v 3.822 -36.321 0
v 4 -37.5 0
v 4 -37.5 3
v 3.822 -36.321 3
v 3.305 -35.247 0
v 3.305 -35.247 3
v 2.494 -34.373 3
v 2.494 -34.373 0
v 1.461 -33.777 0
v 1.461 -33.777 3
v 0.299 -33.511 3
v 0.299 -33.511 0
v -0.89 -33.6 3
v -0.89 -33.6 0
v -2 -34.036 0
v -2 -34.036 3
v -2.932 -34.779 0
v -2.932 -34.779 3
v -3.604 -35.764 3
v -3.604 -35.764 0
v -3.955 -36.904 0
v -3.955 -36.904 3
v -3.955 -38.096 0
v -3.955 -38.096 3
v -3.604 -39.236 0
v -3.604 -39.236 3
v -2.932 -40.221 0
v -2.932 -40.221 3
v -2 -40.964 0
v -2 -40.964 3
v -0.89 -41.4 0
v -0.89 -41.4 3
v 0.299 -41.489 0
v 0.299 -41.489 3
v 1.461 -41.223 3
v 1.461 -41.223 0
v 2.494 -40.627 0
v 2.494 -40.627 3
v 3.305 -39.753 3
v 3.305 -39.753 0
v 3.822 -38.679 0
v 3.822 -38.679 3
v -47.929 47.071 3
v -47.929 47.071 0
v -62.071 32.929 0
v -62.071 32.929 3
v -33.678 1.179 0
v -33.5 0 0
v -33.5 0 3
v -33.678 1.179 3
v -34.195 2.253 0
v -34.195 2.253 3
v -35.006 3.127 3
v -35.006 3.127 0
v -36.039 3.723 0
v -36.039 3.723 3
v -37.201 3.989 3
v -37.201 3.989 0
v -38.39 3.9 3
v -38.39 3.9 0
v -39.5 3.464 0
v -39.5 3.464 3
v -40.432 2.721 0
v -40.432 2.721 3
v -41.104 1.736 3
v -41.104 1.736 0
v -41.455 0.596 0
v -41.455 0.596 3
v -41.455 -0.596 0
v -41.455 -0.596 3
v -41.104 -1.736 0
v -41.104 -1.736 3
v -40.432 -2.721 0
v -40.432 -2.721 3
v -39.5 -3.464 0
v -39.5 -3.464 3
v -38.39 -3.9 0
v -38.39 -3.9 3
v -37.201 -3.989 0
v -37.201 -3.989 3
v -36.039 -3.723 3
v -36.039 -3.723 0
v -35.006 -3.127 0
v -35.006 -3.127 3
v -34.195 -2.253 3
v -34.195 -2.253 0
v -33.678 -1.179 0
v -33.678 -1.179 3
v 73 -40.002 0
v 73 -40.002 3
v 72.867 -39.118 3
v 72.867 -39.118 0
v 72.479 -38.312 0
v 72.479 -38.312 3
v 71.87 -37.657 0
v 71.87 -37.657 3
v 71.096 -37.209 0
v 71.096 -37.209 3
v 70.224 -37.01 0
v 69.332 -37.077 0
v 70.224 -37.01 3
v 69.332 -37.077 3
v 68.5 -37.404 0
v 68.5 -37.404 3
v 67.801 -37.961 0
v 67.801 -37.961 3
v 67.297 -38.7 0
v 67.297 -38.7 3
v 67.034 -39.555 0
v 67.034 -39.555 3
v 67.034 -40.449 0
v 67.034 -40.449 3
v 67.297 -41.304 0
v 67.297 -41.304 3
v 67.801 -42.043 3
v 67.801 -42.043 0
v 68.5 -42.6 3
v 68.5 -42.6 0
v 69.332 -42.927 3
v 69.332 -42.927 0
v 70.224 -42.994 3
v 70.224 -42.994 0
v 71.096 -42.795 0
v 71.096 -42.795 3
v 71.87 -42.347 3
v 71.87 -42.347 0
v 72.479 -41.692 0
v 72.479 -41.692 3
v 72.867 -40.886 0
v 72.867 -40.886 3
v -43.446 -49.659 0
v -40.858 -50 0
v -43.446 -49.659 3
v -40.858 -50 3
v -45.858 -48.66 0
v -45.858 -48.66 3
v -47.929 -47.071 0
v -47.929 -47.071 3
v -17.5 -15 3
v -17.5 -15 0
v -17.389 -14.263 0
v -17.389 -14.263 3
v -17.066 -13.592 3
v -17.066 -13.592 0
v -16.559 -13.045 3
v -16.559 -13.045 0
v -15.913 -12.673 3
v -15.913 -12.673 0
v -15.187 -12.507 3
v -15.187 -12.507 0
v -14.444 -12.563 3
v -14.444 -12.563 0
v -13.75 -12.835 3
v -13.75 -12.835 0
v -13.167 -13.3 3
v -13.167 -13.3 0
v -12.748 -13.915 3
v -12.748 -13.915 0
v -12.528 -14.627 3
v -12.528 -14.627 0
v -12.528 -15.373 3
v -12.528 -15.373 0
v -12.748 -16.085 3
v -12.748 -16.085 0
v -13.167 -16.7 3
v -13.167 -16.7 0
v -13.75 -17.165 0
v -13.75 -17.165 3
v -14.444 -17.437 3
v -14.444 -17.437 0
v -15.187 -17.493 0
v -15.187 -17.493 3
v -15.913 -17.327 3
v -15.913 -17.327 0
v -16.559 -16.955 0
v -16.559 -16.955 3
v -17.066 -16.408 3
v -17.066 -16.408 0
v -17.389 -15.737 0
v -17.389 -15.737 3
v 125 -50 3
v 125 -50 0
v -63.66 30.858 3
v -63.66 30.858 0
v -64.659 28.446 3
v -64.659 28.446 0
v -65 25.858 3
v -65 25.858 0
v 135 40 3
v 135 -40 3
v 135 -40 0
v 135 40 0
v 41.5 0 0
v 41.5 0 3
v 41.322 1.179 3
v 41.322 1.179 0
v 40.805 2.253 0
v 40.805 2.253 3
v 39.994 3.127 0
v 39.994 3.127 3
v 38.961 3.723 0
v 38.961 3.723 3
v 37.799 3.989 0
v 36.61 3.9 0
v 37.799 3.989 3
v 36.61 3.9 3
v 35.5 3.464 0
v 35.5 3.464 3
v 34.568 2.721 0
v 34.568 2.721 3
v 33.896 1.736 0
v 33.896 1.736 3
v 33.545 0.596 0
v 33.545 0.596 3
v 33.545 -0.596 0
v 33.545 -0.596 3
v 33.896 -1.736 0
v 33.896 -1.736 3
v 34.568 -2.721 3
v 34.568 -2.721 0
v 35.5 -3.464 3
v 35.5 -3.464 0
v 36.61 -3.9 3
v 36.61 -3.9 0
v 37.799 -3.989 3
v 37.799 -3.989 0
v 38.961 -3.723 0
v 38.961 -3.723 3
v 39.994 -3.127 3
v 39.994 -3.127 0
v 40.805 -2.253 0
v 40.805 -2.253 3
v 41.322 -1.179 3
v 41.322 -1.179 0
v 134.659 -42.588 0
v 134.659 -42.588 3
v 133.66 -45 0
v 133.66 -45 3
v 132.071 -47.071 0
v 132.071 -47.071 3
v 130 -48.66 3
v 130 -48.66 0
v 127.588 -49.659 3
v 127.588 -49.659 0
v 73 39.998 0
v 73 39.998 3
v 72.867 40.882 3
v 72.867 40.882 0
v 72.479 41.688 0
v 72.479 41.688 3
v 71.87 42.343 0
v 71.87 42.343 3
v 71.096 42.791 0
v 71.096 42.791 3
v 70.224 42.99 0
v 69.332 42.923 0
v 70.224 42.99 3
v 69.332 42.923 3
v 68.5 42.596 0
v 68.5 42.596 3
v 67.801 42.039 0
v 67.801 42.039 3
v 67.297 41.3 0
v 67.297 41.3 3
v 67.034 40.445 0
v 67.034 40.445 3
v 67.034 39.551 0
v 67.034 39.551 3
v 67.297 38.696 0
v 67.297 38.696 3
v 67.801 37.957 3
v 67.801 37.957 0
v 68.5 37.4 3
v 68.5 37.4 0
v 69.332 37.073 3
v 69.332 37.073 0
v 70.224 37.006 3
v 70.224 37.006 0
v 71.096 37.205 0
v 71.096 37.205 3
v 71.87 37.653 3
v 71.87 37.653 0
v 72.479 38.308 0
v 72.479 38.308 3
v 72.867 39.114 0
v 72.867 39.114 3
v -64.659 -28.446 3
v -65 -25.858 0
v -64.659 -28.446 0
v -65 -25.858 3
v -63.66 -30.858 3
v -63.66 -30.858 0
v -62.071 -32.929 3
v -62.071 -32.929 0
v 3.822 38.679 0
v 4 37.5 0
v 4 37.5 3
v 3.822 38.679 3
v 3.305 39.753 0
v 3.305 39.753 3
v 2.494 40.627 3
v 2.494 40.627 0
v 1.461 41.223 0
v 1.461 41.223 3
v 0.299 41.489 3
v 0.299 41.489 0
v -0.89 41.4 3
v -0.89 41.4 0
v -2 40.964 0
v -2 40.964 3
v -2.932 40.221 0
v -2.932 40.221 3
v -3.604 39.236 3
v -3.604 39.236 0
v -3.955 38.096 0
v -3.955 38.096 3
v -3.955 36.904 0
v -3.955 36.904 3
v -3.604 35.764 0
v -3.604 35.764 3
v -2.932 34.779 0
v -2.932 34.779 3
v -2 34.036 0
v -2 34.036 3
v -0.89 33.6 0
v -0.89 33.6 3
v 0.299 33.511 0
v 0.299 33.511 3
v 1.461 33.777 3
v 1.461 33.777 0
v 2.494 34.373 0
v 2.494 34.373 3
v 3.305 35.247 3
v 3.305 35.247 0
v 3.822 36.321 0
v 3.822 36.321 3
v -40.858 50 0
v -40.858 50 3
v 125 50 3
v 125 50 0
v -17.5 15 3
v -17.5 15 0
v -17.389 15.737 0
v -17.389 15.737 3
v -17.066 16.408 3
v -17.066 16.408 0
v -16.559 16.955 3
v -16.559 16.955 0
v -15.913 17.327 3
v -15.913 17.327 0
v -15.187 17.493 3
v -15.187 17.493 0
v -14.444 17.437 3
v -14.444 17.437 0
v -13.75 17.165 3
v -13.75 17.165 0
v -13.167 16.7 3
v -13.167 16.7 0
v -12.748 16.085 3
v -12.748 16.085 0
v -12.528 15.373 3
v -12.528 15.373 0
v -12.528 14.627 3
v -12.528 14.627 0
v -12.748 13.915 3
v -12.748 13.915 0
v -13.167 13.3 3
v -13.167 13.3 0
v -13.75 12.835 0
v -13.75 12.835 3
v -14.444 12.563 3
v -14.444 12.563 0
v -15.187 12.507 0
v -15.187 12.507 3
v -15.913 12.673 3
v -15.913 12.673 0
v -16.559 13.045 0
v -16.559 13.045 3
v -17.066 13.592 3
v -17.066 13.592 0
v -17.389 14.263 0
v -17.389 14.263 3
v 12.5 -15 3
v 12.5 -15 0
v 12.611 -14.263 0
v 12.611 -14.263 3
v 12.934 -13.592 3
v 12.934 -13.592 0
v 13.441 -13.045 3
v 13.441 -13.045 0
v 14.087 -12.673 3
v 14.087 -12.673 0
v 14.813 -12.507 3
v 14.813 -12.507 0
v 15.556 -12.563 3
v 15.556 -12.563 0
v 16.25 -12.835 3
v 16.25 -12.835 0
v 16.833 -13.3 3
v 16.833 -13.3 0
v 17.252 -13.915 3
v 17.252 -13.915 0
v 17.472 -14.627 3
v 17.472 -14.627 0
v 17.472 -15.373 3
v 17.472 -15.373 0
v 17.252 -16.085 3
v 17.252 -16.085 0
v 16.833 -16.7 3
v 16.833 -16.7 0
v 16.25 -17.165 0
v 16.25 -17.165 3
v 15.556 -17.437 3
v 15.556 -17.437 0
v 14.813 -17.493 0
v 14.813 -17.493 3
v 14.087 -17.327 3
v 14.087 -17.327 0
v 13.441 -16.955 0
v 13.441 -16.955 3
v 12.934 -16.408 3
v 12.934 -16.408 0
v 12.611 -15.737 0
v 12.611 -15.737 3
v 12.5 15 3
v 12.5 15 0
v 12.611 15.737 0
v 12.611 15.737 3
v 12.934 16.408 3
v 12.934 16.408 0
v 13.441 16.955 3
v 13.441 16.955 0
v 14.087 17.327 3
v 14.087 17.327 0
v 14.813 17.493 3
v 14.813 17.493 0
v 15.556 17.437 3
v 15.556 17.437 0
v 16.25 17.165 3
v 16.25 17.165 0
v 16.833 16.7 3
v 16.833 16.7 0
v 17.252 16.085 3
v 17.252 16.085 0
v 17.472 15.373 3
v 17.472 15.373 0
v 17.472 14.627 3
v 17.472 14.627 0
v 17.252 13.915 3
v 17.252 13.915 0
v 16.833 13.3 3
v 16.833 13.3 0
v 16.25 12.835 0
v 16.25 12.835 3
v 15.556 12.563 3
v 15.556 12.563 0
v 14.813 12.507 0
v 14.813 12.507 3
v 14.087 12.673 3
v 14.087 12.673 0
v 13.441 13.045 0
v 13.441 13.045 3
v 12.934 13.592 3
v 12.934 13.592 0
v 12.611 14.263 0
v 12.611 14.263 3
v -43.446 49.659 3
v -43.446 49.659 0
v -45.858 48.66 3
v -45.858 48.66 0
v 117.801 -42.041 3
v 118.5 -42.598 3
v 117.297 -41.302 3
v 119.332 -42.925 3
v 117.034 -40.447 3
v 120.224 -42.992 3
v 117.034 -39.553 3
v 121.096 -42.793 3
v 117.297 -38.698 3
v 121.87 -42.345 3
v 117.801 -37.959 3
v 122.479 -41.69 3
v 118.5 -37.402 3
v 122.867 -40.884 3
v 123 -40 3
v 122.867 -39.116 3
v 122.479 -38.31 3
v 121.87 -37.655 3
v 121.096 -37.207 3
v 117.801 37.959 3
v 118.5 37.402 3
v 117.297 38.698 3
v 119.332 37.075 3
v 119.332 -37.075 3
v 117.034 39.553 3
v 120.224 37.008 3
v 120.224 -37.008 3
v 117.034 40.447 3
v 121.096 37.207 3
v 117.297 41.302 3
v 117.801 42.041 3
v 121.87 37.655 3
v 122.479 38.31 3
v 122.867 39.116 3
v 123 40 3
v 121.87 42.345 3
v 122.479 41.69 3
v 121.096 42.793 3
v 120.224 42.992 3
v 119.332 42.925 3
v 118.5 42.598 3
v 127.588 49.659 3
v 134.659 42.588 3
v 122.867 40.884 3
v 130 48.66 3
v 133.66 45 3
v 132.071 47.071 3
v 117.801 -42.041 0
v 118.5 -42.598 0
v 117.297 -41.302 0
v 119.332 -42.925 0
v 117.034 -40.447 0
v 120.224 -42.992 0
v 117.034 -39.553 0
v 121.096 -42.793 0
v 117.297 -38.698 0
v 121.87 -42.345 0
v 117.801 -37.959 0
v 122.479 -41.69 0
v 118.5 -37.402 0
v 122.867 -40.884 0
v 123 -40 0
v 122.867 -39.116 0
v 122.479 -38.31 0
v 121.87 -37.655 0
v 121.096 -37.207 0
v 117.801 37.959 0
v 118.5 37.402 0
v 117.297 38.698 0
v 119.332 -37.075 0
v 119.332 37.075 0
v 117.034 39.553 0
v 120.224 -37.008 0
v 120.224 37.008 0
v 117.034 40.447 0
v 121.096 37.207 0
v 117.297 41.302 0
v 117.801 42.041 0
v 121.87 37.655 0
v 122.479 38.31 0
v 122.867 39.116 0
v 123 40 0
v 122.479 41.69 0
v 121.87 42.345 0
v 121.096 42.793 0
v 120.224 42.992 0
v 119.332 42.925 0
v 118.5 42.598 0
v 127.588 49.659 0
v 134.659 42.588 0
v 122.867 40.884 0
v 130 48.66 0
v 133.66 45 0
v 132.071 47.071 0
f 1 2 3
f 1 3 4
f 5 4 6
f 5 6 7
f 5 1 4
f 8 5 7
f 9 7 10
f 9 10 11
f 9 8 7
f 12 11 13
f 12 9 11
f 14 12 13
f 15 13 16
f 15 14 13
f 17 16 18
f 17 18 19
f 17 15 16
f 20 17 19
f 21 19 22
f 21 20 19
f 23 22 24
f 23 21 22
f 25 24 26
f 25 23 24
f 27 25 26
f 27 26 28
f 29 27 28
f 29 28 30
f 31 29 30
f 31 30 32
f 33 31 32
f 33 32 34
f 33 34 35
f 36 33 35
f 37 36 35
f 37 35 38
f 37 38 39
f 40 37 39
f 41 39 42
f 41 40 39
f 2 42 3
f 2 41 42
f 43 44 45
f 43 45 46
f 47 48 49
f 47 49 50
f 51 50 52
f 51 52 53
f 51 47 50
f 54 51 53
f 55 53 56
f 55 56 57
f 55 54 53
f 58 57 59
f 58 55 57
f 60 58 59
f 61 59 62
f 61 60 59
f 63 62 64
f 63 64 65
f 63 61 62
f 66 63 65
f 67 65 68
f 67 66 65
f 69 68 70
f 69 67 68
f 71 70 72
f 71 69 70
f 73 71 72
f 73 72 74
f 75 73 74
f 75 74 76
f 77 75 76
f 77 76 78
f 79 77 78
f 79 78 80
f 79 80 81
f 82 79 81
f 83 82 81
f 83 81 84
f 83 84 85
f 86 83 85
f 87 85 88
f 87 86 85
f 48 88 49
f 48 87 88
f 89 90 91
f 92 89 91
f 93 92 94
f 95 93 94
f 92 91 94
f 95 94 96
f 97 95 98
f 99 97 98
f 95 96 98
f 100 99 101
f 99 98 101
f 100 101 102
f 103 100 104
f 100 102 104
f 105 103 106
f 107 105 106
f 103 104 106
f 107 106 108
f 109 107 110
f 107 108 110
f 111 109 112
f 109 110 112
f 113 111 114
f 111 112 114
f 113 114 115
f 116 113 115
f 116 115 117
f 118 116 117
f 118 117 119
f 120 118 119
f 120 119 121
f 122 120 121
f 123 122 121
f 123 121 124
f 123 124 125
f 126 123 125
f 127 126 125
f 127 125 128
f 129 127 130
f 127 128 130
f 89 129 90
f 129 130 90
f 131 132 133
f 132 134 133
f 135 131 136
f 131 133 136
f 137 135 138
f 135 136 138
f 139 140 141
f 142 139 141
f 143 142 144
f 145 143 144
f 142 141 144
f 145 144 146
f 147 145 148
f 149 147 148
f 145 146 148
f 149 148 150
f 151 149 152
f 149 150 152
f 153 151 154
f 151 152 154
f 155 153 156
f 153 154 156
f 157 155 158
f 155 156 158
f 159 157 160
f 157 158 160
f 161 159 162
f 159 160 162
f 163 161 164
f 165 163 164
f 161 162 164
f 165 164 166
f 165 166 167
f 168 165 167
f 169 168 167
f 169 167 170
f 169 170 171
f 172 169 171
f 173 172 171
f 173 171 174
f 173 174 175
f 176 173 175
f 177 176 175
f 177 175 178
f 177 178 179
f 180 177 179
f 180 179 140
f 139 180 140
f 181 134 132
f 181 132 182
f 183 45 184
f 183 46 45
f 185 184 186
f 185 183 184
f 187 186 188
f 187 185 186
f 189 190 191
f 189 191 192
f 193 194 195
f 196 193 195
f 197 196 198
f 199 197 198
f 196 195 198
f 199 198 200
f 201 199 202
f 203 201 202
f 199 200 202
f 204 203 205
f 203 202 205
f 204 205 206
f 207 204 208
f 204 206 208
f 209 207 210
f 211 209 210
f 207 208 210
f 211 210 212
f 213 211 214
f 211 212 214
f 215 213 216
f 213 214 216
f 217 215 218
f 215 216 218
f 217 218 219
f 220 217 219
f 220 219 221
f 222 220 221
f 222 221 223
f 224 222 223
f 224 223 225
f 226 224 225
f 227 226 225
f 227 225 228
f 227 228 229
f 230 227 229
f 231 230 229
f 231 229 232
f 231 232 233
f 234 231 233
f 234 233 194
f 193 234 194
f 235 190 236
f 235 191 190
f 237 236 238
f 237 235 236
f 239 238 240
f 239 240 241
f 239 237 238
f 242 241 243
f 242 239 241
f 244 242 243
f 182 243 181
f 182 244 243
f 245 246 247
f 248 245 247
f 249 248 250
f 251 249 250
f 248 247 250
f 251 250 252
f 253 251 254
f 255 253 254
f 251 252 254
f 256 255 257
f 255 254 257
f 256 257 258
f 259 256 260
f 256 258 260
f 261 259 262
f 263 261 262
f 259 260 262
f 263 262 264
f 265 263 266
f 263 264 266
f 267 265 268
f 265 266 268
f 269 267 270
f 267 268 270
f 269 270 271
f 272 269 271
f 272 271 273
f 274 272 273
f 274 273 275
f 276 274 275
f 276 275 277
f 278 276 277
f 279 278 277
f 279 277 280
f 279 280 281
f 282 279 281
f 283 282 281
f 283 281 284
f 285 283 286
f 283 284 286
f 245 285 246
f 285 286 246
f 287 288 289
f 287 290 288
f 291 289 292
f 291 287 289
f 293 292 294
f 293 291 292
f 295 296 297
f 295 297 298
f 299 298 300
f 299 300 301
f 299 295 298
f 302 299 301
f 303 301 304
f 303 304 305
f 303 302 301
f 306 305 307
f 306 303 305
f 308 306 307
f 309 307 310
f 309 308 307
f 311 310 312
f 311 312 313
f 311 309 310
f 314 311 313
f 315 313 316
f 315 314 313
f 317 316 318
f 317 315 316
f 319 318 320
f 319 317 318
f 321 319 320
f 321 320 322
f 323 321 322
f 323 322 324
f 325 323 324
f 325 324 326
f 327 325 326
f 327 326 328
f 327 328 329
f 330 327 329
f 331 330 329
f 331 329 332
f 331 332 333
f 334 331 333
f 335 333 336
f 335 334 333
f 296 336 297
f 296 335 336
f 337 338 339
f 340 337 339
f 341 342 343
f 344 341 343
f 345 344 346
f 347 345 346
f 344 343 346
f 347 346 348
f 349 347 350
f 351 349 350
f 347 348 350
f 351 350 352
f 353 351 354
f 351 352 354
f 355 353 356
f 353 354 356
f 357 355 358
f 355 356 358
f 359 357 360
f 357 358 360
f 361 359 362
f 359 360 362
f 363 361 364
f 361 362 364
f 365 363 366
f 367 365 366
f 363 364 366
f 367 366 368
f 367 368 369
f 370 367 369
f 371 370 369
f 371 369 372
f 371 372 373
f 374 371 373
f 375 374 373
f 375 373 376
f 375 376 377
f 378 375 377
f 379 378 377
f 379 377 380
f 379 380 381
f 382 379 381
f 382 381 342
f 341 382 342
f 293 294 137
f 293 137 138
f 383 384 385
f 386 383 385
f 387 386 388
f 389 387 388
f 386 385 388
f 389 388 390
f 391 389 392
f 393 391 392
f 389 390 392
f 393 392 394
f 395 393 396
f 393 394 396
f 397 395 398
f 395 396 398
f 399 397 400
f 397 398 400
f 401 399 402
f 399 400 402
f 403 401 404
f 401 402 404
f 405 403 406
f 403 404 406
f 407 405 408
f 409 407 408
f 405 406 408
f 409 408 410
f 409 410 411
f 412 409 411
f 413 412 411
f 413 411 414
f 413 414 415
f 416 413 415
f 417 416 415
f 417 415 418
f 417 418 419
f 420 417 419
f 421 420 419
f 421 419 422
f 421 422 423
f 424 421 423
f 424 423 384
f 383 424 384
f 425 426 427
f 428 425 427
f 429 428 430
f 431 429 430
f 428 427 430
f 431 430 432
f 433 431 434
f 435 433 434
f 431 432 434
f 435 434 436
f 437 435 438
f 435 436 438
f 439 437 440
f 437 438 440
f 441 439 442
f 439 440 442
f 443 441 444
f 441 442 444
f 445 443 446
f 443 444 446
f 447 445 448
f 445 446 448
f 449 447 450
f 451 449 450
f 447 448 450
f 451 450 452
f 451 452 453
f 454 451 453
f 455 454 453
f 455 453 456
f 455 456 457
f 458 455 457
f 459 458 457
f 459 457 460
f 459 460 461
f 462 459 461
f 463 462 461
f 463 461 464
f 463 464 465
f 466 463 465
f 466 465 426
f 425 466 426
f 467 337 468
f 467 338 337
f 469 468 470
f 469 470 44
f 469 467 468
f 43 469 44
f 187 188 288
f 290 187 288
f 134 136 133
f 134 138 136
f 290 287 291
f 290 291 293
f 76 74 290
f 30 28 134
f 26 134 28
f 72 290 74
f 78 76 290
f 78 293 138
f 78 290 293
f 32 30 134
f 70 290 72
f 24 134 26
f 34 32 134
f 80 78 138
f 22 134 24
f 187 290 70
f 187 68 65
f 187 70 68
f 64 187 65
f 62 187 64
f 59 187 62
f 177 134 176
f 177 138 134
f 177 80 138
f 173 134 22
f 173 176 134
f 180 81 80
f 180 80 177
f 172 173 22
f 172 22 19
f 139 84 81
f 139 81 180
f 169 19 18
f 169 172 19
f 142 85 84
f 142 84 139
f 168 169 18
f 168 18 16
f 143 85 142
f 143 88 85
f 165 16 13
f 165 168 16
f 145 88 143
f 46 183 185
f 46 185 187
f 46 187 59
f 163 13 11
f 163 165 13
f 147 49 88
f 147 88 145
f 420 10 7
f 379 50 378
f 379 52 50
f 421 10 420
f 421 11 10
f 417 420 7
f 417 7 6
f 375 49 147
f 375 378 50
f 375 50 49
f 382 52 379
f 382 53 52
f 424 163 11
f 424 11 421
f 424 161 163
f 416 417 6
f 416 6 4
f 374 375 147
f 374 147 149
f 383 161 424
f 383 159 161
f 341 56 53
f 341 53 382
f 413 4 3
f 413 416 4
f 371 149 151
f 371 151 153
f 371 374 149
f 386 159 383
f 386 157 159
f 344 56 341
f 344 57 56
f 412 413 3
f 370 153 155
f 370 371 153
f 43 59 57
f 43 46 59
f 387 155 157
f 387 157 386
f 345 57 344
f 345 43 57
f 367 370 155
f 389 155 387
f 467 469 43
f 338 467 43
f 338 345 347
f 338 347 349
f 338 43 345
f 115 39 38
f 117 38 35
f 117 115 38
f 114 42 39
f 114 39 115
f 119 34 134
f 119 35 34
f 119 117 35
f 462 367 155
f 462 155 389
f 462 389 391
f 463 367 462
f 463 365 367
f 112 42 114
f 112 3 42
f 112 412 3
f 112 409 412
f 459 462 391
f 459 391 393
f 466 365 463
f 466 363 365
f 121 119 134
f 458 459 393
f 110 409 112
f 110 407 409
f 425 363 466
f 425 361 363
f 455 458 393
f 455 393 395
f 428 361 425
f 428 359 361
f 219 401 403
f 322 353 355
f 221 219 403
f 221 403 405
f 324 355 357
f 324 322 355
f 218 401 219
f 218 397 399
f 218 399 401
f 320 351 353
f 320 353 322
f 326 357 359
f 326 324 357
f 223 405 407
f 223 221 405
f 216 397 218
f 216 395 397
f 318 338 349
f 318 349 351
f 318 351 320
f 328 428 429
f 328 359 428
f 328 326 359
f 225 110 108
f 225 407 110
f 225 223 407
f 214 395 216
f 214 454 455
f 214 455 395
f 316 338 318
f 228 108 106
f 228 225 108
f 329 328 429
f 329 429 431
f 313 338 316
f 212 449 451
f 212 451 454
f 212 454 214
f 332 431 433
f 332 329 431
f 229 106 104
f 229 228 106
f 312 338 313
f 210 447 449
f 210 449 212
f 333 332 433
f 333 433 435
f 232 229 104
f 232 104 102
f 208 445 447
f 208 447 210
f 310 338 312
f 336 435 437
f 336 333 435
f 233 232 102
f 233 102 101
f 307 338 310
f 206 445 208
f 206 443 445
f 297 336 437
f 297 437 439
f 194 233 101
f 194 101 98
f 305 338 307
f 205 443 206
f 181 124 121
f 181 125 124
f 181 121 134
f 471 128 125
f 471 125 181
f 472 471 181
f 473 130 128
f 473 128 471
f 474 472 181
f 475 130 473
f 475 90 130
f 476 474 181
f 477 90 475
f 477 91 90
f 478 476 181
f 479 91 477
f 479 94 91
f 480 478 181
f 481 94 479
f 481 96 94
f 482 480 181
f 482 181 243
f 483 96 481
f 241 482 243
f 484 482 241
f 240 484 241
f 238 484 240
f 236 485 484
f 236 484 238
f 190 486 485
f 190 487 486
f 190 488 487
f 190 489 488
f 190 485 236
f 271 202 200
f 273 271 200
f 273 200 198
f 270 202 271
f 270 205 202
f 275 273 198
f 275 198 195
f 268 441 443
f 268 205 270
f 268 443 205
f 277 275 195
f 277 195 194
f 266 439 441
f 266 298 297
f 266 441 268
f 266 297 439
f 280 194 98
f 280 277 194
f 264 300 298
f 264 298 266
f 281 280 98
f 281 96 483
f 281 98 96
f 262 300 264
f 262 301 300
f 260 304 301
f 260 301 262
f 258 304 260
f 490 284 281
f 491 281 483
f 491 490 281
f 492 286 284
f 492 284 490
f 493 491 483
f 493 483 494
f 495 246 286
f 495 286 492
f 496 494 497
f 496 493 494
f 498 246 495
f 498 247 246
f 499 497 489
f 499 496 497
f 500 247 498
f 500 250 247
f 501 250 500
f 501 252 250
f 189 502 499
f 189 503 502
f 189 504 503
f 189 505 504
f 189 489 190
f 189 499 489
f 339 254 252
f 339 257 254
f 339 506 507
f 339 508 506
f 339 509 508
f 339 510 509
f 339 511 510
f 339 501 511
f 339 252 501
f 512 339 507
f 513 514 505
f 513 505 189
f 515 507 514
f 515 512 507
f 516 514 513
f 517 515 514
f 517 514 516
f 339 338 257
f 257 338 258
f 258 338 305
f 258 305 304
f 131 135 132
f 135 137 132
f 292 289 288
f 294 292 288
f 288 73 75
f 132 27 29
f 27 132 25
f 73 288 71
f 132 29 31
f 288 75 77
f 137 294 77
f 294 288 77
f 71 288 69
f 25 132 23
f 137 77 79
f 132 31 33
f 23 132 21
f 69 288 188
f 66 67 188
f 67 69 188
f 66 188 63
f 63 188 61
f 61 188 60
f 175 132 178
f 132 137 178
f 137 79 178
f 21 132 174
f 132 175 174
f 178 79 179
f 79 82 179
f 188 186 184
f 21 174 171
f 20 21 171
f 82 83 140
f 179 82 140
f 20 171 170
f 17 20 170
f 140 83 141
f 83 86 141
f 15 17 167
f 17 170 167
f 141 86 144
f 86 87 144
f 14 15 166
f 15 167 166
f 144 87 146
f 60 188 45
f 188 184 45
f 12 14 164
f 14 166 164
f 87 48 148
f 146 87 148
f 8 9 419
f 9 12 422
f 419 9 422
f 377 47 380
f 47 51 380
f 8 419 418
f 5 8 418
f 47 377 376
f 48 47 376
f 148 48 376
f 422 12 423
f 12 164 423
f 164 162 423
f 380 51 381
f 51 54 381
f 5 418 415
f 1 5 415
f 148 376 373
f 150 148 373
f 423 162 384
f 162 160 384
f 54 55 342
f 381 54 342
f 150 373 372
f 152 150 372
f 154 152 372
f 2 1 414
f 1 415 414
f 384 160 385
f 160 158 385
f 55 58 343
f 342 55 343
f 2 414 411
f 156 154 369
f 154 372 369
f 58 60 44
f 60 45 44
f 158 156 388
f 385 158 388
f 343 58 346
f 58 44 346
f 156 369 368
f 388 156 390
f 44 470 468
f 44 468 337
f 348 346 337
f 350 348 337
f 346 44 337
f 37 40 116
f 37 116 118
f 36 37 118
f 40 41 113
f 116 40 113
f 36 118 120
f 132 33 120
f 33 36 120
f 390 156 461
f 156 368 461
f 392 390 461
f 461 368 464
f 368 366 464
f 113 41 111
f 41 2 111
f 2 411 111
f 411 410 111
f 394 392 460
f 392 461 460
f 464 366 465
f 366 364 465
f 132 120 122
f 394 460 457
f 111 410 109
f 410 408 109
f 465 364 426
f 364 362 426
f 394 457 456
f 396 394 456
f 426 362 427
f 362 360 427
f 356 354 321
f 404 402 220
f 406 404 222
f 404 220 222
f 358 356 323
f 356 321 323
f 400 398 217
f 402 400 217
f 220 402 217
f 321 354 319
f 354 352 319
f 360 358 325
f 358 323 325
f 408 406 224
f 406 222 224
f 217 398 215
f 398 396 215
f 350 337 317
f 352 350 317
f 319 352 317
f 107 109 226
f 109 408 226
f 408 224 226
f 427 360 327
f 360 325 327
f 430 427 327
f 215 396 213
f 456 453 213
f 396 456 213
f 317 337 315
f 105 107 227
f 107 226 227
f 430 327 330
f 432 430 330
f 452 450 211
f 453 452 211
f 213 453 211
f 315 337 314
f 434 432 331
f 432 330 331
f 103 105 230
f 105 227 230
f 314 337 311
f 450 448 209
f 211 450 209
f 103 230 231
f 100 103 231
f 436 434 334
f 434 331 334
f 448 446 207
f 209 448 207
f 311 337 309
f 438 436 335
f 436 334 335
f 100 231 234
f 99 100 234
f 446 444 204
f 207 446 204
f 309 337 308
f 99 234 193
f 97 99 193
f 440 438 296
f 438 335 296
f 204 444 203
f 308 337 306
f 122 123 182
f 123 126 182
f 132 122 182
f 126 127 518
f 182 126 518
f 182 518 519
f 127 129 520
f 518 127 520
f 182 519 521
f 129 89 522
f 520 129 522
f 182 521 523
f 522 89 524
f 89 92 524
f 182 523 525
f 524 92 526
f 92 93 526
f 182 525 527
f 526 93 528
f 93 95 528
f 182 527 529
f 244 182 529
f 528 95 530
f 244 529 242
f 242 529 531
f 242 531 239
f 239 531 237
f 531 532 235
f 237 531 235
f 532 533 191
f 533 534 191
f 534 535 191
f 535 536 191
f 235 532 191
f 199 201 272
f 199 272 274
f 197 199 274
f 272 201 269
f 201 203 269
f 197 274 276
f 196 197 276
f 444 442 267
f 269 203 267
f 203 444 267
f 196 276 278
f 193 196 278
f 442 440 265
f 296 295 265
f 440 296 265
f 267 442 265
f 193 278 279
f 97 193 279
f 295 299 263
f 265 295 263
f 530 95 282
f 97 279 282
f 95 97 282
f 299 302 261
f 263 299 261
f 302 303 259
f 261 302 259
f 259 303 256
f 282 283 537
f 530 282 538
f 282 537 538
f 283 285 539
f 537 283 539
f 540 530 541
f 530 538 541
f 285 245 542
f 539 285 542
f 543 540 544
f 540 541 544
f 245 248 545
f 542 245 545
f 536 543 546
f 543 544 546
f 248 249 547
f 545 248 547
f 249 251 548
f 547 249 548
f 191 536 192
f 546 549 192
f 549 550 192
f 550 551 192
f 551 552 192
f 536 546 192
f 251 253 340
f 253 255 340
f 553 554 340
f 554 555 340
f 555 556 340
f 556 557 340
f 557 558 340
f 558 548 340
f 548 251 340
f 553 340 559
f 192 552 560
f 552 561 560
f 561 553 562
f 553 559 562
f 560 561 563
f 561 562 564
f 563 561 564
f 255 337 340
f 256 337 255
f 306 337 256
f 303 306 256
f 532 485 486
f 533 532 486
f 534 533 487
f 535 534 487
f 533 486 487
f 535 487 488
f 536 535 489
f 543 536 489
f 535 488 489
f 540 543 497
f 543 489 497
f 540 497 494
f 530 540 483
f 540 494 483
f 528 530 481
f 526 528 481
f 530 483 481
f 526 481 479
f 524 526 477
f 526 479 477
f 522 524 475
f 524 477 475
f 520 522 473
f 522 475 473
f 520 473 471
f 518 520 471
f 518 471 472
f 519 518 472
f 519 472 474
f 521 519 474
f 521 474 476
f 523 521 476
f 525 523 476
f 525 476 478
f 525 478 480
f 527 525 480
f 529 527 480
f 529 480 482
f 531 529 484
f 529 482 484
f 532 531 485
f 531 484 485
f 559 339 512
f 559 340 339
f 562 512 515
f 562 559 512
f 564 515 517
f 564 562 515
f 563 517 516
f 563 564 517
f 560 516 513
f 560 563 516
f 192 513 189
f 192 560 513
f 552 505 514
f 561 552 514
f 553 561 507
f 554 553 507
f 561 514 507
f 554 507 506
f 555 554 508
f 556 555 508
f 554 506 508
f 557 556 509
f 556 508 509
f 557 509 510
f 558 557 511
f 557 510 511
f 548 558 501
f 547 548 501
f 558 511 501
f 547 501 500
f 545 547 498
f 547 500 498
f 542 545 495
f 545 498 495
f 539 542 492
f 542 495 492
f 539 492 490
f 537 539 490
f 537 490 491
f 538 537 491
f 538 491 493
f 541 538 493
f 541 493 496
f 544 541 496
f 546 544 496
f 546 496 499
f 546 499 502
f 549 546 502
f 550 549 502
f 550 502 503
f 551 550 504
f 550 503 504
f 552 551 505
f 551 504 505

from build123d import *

# Parameters (mm, degrees)
SKETCH1_R                = 60
SKETCH1_R_2              = 4
BOSS_EXTRUDE1_DEPTH      = 3
SKETCH2_W                = 110
SKETCH2_H                = 12
BOSS_EXTRUDE2_DEPTH      = 4
F_5_0_5_DIAMETER_HOLE1_D = 5
SKETCH5_W                = 110
SKETCH5_H                = 100
SKETCH5_R                = 3
BOSS_EXTRUDE3_DEPTH      = 3
BOSS_EXTRUDE4_START      = -3
BOSS_EXTRUDE4_DEPTH      = 3
SKETCH7_W                = 250
SKETCH7_H                = 150
SKETCH7_W_2              = 200
SKETCH7_H_2              = 100
CUT_EXTRUDE1_DEPTH       = 5
CHAMFER1_SIZE            = 20
SKETCH8_R                = 4
CUT_EXTRUDE2_DEPTH       = 15
FILLET1_R                = 10
CUT_EXTRUDE3_START       = -4
SKETCH9_W                = 110
SKETCH9_H                = 12
SKETCH9_R                = 2.5
CUT_EXTRUDE3_DEPTH       = 4


with BuildPart() as part:
    # Sketch1 → Boss-Extrude1 (new body)
    with BuildSketch(Plane.XY):
        Circle(SKETCH1_R)
        with Locations((-37.5, 0)):
            Circle(SKETCH1_R_2, mode=Mode.SUBTRACT)
        with Locations((0, -37.5)):
            Circle(SKETCH1_R_2, mode=Mode.SUBTRACT)
        with Locations((37.5, 0)):
            Circle(SKETCH1_R_2, mode=Mode.SUBTRACT)
        with Locations((0, 37.5)):
            Circle(SKETCH1_R_2, mode=Mode.SUBTRACT)
    extrude(amount=BOSS_EXTRUDE1_DEPTH)

    # Sketch2 → Boss-Extrude2 (add)
    with BuildSketch(Plane.XY.offset(3)):
        with Locations((5, 15)):
            Rectangle(SKETCH2_W, SKETCH2_H)
    extrude(amount=BOSS_EXTRUDE2_DEPTH)

    # Ø5.0 (5) Diameter Hole1 (through all)
    with Locations(Plane.XY.offset(7)):
        with Locations((-15, 15), (15, 15), (-15, -15), (15, -15)):
            Hole(F_5_0_5_DIAMETER_HOLE1_D / 2)

    # Sketch5 → Boss-Extrude3 (add)
    with BuildSketch(Plane.XY.offset(3)):
        with Locations((80, 0)):
            Rectangle(SKETCH5_W, SKETCH5_H)
        with Locations((70, 39.998003983)):
            Circle(SKETCH5_R, mode=Mode.SUBTRACT)
        with Locations((119.99999996, 40)):
            Circle(SKETCH5_R, mode=Mode.SUBTRACT)
        with Locations((119.99999996, -40)):
            Circle(SKETCH5_R, mode=Mode.SUBTRACT)
        with Locations((70, -40.001996017)):
            Circle(SKETCH5_R, mode=Mode.SUBTRACT)
    extrude(amount=-BOSS_EXTRUDE3_DEPTH)

    # Sketch6 → Boss-Extrude4 (add)
    with BuildSketch(Plane.XY.offset(3).offset(BOSS_EXTRUDE4_START)):
        with BuildLine():
            ThreePointArc((-33.166247904, -50), (-60, 0), (-33.166247904, 50))
            Line((-33.166247904, 50), (-65, 50))
            Line((-65, 50), (-65, -50))
            Line((-65, -50), (-33.166247904, -50))
        make_face()
    extrude(amount=BOSS_EXTRUDE4_DEPTH)

    # Sketch7 → Cut-Extrude1 (cut)
    with BuildSketch(Plane.XY.offset(3)):
        with Locations((35, 0)):
            Rectangle(SKETCH7_W, SKETCH7_H)
        with Locations((35, 0)):
            Rectangle(SKETCH7_W_2, SKETCH7_H_2, mode=Mode.SUBTRACT)
    extrude(amount=-CUT_EXTRUDE1_DEPTH, mode=Mode.SUBTRACT)

    # Chamfer1
    chamfer1_edges = [part.edges().sort_by_distance(p)[0] for p in [
        (-65, 50, 1.5),
        (-65, -50, 1.5),
    ]]
    chamfer(chamfer1_edges, length=CHAMFER1_SIZE)

    # Sketch8 → Cut-Extrude2 (cut)
    with BuildSketch(Plane.XY.offset(3)):
        with Locations((37.5, 0)):
            Circle(SKETCH8_R)
    extrude(amount=-CUT_EXTRUDE2_DEPTH, mode=Mode.SUBTRACT)

    # Fillet1
    fillet1_edges = [part.edges().sort_by_distance(p)[0] for p in [
        (-45, 50, 1.5),
        (-65, -30, 1.5),
        (-65, 30, 1.5),
        (-45, -50, 1.5),
        (135, -50, 1.5),
        (135, 50, 1.5),
    ]]
    fillet(fillet1_edges, radius=FILLET1_R)

    # Sketch9 → Cut-Extrude3 (cut)
    with BuildSketch(Plane.XY.offset(7).offset(CUT_EXTRUDE3_START)):
        with Locations((5, 15)):
            Rectangle(SKETCH9_W, SKETCH9_H)
        with Locations((-15, 15)):
            Circle(SKETCH9_R, mode=Mode.SUBTRACT)
        with Locations((15, 15)):
            Circle(SKETCH9_R, mode=Mode.SUBTRACT)
    extrude(amount=CUT_EXTRUDE3_DEPTH, mode=Mode.SUBTRACT)


solid = part.part
